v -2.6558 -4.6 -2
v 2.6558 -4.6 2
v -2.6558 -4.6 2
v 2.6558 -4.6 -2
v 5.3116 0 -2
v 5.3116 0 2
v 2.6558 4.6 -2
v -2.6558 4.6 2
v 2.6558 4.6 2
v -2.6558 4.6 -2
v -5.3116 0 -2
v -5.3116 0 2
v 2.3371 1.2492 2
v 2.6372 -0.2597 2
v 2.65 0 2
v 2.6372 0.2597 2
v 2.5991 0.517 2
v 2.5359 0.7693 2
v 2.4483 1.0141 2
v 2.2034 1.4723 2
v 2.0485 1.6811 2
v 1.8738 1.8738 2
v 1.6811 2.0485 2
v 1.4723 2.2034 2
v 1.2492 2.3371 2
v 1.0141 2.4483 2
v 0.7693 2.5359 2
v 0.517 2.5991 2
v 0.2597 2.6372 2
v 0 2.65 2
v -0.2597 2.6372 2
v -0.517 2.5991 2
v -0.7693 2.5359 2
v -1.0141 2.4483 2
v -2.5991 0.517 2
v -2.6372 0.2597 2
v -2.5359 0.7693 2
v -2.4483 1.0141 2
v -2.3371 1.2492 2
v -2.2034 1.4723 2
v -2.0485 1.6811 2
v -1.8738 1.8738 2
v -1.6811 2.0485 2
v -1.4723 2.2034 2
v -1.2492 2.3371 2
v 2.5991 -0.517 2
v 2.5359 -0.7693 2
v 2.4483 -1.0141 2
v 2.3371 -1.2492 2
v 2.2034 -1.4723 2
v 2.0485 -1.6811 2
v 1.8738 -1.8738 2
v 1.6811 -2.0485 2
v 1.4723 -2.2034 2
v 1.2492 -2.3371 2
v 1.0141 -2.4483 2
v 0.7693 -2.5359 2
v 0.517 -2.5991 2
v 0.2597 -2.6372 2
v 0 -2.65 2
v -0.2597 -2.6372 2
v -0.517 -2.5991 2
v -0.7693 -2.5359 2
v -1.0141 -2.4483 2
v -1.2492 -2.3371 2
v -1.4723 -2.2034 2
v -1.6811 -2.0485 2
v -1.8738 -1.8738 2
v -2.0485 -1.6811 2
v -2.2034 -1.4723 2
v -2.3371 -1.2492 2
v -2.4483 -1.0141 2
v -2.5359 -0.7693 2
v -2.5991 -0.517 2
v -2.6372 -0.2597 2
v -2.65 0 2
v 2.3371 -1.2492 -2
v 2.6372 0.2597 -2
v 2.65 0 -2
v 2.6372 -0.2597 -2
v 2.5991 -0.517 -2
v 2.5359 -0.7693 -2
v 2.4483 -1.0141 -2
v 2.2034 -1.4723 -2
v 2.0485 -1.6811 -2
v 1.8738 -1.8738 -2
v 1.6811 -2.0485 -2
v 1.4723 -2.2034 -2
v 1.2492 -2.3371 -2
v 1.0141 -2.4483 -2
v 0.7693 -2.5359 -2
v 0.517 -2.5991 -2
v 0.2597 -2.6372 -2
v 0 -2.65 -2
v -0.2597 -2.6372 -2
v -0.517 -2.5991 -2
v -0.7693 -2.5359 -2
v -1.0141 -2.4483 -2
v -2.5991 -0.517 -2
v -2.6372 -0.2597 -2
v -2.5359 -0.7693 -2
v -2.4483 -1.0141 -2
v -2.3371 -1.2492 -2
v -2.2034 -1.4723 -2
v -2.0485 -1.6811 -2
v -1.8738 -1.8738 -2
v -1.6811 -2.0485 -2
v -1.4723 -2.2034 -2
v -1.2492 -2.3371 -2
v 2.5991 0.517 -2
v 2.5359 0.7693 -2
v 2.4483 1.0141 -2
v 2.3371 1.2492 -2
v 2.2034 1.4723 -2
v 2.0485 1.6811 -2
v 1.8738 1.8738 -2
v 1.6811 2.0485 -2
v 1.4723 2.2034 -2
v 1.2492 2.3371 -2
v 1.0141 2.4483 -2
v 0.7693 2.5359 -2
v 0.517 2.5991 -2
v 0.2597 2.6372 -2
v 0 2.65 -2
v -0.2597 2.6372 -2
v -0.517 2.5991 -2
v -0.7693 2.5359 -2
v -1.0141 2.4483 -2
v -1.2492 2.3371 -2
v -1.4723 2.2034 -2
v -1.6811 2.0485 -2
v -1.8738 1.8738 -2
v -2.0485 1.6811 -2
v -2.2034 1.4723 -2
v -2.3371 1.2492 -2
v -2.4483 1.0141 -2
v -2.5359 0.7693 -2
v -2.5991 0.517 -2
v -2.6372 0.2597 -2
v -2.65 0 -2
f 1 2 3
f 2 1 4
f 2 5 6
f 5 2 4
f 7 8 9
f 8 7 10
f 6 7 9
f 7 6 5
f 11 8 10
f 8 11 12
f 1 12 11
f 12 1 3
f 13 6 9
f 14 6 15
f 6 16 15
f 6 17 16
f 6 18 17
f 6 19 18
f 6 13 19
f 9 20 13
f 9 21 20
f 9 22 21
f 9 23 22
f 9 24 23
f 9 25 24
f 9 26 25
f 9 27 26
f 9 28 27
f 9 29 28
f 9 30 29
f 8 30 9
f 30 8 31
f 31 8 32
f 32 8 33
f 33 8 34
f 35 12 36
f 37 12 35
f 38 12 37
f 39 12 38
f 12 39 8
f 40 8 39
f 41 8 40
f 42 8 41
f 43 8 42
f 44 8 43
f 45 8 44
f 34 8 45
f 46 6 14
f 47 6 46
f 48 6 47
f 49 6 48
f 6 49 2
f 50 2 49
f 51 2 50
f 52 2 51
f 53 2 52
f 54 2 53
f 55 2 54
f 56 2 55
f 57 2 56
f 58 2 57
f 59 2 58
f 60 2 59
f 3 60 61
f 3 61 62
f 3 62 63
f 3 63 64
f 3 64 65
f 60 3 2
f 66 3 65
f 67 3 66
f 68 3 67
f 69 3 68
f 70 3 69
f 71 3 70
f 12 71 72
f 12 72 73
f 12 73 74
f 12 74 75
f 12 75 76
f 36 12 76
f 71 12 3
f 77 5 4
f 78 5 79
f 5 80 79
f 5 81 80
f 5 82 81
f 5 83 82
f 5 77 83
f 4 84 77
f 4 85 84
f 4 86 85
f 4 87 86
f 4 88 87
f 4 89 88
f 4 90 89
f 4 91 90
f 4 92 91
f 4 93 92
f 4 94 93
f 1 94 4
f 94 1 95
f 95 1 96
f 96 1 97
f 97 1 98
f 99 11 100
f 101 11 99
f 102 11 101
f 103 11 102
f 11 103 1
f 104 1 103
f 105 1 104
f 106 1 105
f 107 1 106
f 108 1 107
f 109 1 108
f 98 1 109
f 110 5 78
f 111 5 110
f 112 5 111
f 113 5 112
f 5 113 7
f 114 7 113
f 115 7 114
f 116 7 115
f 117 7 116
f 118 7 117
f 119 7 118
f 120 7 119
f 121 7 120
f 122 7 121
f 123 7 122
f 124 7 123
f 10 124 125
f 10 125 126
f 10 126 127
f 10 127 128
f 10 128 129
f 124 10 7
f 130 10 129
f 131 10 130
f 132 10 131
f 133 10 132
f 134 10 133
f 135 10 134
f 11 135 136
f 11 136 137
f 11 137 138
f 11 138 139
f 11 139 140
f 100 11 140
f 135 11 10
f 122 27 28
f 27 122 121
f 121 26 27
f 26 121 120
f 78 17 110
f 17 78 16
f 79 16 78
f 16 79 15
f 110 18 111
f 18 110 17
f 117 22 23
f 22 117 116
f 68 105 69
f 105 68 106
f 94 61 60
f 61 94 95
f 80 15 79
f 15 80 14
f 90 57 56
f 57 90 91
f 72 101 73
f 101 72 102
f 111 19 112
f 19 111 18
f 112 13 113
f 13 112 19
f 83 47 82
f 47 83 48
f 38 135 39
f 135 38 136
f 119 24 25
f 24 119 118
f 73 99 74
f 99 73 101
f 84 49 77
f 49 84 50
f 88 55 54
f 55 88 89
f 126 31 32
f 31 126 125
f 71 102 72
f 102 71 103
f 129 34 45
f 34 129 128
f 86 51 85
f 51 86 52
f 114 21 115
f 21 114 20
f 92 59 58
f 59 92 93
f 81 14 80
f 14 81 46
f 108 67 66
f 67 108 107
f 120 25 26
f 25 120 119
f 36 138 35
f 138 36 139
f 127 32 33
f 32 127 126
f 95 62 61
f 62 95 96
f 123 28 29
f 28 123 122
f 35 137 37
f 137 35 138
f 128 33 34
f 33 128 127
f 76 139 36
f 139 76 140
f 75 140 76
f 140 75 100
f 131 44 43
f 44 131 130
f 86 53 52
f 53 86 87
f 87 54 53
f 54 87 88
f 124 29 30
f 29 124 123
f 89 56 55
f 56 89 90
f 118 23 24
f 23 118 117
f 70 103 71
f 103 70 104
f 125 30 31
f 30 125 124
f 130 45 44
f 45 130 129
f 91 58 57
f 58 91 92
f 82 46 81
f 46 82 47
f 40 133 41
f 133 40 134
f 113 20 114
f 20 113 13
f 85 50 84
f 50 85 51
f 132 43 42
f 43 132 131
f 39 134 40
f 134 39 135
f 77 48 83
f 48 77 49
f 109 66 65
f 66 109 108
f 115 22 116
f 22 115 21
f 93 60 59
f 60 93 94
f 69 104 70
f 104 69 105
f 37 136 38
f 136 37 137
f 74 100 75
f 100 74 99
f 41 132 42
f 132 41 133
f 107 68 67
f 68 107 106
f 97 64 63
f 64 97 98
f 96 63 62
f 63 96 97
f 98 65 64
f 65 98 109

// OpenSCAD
$fn=64;

module hex_prism(af=9.2, h=4.0){
    r = af / sqrt(3);
    cylinder(h=h, r=r, center=true, $fn=6);
}

module nut(m_screw=5.0, af=9.2, thickness=4.0, clearance=0.3){
    hole_d = m_screw + clearance;
    difference(){
        hex_prism(af=af, h=thickness);
        cylinder(h=thickness+0.4, d=hole_d, center=true, $fn=64);
    }
}

nut(m_screw=5.0, af=9.2, thickness=4.0, clearance=0.3);
